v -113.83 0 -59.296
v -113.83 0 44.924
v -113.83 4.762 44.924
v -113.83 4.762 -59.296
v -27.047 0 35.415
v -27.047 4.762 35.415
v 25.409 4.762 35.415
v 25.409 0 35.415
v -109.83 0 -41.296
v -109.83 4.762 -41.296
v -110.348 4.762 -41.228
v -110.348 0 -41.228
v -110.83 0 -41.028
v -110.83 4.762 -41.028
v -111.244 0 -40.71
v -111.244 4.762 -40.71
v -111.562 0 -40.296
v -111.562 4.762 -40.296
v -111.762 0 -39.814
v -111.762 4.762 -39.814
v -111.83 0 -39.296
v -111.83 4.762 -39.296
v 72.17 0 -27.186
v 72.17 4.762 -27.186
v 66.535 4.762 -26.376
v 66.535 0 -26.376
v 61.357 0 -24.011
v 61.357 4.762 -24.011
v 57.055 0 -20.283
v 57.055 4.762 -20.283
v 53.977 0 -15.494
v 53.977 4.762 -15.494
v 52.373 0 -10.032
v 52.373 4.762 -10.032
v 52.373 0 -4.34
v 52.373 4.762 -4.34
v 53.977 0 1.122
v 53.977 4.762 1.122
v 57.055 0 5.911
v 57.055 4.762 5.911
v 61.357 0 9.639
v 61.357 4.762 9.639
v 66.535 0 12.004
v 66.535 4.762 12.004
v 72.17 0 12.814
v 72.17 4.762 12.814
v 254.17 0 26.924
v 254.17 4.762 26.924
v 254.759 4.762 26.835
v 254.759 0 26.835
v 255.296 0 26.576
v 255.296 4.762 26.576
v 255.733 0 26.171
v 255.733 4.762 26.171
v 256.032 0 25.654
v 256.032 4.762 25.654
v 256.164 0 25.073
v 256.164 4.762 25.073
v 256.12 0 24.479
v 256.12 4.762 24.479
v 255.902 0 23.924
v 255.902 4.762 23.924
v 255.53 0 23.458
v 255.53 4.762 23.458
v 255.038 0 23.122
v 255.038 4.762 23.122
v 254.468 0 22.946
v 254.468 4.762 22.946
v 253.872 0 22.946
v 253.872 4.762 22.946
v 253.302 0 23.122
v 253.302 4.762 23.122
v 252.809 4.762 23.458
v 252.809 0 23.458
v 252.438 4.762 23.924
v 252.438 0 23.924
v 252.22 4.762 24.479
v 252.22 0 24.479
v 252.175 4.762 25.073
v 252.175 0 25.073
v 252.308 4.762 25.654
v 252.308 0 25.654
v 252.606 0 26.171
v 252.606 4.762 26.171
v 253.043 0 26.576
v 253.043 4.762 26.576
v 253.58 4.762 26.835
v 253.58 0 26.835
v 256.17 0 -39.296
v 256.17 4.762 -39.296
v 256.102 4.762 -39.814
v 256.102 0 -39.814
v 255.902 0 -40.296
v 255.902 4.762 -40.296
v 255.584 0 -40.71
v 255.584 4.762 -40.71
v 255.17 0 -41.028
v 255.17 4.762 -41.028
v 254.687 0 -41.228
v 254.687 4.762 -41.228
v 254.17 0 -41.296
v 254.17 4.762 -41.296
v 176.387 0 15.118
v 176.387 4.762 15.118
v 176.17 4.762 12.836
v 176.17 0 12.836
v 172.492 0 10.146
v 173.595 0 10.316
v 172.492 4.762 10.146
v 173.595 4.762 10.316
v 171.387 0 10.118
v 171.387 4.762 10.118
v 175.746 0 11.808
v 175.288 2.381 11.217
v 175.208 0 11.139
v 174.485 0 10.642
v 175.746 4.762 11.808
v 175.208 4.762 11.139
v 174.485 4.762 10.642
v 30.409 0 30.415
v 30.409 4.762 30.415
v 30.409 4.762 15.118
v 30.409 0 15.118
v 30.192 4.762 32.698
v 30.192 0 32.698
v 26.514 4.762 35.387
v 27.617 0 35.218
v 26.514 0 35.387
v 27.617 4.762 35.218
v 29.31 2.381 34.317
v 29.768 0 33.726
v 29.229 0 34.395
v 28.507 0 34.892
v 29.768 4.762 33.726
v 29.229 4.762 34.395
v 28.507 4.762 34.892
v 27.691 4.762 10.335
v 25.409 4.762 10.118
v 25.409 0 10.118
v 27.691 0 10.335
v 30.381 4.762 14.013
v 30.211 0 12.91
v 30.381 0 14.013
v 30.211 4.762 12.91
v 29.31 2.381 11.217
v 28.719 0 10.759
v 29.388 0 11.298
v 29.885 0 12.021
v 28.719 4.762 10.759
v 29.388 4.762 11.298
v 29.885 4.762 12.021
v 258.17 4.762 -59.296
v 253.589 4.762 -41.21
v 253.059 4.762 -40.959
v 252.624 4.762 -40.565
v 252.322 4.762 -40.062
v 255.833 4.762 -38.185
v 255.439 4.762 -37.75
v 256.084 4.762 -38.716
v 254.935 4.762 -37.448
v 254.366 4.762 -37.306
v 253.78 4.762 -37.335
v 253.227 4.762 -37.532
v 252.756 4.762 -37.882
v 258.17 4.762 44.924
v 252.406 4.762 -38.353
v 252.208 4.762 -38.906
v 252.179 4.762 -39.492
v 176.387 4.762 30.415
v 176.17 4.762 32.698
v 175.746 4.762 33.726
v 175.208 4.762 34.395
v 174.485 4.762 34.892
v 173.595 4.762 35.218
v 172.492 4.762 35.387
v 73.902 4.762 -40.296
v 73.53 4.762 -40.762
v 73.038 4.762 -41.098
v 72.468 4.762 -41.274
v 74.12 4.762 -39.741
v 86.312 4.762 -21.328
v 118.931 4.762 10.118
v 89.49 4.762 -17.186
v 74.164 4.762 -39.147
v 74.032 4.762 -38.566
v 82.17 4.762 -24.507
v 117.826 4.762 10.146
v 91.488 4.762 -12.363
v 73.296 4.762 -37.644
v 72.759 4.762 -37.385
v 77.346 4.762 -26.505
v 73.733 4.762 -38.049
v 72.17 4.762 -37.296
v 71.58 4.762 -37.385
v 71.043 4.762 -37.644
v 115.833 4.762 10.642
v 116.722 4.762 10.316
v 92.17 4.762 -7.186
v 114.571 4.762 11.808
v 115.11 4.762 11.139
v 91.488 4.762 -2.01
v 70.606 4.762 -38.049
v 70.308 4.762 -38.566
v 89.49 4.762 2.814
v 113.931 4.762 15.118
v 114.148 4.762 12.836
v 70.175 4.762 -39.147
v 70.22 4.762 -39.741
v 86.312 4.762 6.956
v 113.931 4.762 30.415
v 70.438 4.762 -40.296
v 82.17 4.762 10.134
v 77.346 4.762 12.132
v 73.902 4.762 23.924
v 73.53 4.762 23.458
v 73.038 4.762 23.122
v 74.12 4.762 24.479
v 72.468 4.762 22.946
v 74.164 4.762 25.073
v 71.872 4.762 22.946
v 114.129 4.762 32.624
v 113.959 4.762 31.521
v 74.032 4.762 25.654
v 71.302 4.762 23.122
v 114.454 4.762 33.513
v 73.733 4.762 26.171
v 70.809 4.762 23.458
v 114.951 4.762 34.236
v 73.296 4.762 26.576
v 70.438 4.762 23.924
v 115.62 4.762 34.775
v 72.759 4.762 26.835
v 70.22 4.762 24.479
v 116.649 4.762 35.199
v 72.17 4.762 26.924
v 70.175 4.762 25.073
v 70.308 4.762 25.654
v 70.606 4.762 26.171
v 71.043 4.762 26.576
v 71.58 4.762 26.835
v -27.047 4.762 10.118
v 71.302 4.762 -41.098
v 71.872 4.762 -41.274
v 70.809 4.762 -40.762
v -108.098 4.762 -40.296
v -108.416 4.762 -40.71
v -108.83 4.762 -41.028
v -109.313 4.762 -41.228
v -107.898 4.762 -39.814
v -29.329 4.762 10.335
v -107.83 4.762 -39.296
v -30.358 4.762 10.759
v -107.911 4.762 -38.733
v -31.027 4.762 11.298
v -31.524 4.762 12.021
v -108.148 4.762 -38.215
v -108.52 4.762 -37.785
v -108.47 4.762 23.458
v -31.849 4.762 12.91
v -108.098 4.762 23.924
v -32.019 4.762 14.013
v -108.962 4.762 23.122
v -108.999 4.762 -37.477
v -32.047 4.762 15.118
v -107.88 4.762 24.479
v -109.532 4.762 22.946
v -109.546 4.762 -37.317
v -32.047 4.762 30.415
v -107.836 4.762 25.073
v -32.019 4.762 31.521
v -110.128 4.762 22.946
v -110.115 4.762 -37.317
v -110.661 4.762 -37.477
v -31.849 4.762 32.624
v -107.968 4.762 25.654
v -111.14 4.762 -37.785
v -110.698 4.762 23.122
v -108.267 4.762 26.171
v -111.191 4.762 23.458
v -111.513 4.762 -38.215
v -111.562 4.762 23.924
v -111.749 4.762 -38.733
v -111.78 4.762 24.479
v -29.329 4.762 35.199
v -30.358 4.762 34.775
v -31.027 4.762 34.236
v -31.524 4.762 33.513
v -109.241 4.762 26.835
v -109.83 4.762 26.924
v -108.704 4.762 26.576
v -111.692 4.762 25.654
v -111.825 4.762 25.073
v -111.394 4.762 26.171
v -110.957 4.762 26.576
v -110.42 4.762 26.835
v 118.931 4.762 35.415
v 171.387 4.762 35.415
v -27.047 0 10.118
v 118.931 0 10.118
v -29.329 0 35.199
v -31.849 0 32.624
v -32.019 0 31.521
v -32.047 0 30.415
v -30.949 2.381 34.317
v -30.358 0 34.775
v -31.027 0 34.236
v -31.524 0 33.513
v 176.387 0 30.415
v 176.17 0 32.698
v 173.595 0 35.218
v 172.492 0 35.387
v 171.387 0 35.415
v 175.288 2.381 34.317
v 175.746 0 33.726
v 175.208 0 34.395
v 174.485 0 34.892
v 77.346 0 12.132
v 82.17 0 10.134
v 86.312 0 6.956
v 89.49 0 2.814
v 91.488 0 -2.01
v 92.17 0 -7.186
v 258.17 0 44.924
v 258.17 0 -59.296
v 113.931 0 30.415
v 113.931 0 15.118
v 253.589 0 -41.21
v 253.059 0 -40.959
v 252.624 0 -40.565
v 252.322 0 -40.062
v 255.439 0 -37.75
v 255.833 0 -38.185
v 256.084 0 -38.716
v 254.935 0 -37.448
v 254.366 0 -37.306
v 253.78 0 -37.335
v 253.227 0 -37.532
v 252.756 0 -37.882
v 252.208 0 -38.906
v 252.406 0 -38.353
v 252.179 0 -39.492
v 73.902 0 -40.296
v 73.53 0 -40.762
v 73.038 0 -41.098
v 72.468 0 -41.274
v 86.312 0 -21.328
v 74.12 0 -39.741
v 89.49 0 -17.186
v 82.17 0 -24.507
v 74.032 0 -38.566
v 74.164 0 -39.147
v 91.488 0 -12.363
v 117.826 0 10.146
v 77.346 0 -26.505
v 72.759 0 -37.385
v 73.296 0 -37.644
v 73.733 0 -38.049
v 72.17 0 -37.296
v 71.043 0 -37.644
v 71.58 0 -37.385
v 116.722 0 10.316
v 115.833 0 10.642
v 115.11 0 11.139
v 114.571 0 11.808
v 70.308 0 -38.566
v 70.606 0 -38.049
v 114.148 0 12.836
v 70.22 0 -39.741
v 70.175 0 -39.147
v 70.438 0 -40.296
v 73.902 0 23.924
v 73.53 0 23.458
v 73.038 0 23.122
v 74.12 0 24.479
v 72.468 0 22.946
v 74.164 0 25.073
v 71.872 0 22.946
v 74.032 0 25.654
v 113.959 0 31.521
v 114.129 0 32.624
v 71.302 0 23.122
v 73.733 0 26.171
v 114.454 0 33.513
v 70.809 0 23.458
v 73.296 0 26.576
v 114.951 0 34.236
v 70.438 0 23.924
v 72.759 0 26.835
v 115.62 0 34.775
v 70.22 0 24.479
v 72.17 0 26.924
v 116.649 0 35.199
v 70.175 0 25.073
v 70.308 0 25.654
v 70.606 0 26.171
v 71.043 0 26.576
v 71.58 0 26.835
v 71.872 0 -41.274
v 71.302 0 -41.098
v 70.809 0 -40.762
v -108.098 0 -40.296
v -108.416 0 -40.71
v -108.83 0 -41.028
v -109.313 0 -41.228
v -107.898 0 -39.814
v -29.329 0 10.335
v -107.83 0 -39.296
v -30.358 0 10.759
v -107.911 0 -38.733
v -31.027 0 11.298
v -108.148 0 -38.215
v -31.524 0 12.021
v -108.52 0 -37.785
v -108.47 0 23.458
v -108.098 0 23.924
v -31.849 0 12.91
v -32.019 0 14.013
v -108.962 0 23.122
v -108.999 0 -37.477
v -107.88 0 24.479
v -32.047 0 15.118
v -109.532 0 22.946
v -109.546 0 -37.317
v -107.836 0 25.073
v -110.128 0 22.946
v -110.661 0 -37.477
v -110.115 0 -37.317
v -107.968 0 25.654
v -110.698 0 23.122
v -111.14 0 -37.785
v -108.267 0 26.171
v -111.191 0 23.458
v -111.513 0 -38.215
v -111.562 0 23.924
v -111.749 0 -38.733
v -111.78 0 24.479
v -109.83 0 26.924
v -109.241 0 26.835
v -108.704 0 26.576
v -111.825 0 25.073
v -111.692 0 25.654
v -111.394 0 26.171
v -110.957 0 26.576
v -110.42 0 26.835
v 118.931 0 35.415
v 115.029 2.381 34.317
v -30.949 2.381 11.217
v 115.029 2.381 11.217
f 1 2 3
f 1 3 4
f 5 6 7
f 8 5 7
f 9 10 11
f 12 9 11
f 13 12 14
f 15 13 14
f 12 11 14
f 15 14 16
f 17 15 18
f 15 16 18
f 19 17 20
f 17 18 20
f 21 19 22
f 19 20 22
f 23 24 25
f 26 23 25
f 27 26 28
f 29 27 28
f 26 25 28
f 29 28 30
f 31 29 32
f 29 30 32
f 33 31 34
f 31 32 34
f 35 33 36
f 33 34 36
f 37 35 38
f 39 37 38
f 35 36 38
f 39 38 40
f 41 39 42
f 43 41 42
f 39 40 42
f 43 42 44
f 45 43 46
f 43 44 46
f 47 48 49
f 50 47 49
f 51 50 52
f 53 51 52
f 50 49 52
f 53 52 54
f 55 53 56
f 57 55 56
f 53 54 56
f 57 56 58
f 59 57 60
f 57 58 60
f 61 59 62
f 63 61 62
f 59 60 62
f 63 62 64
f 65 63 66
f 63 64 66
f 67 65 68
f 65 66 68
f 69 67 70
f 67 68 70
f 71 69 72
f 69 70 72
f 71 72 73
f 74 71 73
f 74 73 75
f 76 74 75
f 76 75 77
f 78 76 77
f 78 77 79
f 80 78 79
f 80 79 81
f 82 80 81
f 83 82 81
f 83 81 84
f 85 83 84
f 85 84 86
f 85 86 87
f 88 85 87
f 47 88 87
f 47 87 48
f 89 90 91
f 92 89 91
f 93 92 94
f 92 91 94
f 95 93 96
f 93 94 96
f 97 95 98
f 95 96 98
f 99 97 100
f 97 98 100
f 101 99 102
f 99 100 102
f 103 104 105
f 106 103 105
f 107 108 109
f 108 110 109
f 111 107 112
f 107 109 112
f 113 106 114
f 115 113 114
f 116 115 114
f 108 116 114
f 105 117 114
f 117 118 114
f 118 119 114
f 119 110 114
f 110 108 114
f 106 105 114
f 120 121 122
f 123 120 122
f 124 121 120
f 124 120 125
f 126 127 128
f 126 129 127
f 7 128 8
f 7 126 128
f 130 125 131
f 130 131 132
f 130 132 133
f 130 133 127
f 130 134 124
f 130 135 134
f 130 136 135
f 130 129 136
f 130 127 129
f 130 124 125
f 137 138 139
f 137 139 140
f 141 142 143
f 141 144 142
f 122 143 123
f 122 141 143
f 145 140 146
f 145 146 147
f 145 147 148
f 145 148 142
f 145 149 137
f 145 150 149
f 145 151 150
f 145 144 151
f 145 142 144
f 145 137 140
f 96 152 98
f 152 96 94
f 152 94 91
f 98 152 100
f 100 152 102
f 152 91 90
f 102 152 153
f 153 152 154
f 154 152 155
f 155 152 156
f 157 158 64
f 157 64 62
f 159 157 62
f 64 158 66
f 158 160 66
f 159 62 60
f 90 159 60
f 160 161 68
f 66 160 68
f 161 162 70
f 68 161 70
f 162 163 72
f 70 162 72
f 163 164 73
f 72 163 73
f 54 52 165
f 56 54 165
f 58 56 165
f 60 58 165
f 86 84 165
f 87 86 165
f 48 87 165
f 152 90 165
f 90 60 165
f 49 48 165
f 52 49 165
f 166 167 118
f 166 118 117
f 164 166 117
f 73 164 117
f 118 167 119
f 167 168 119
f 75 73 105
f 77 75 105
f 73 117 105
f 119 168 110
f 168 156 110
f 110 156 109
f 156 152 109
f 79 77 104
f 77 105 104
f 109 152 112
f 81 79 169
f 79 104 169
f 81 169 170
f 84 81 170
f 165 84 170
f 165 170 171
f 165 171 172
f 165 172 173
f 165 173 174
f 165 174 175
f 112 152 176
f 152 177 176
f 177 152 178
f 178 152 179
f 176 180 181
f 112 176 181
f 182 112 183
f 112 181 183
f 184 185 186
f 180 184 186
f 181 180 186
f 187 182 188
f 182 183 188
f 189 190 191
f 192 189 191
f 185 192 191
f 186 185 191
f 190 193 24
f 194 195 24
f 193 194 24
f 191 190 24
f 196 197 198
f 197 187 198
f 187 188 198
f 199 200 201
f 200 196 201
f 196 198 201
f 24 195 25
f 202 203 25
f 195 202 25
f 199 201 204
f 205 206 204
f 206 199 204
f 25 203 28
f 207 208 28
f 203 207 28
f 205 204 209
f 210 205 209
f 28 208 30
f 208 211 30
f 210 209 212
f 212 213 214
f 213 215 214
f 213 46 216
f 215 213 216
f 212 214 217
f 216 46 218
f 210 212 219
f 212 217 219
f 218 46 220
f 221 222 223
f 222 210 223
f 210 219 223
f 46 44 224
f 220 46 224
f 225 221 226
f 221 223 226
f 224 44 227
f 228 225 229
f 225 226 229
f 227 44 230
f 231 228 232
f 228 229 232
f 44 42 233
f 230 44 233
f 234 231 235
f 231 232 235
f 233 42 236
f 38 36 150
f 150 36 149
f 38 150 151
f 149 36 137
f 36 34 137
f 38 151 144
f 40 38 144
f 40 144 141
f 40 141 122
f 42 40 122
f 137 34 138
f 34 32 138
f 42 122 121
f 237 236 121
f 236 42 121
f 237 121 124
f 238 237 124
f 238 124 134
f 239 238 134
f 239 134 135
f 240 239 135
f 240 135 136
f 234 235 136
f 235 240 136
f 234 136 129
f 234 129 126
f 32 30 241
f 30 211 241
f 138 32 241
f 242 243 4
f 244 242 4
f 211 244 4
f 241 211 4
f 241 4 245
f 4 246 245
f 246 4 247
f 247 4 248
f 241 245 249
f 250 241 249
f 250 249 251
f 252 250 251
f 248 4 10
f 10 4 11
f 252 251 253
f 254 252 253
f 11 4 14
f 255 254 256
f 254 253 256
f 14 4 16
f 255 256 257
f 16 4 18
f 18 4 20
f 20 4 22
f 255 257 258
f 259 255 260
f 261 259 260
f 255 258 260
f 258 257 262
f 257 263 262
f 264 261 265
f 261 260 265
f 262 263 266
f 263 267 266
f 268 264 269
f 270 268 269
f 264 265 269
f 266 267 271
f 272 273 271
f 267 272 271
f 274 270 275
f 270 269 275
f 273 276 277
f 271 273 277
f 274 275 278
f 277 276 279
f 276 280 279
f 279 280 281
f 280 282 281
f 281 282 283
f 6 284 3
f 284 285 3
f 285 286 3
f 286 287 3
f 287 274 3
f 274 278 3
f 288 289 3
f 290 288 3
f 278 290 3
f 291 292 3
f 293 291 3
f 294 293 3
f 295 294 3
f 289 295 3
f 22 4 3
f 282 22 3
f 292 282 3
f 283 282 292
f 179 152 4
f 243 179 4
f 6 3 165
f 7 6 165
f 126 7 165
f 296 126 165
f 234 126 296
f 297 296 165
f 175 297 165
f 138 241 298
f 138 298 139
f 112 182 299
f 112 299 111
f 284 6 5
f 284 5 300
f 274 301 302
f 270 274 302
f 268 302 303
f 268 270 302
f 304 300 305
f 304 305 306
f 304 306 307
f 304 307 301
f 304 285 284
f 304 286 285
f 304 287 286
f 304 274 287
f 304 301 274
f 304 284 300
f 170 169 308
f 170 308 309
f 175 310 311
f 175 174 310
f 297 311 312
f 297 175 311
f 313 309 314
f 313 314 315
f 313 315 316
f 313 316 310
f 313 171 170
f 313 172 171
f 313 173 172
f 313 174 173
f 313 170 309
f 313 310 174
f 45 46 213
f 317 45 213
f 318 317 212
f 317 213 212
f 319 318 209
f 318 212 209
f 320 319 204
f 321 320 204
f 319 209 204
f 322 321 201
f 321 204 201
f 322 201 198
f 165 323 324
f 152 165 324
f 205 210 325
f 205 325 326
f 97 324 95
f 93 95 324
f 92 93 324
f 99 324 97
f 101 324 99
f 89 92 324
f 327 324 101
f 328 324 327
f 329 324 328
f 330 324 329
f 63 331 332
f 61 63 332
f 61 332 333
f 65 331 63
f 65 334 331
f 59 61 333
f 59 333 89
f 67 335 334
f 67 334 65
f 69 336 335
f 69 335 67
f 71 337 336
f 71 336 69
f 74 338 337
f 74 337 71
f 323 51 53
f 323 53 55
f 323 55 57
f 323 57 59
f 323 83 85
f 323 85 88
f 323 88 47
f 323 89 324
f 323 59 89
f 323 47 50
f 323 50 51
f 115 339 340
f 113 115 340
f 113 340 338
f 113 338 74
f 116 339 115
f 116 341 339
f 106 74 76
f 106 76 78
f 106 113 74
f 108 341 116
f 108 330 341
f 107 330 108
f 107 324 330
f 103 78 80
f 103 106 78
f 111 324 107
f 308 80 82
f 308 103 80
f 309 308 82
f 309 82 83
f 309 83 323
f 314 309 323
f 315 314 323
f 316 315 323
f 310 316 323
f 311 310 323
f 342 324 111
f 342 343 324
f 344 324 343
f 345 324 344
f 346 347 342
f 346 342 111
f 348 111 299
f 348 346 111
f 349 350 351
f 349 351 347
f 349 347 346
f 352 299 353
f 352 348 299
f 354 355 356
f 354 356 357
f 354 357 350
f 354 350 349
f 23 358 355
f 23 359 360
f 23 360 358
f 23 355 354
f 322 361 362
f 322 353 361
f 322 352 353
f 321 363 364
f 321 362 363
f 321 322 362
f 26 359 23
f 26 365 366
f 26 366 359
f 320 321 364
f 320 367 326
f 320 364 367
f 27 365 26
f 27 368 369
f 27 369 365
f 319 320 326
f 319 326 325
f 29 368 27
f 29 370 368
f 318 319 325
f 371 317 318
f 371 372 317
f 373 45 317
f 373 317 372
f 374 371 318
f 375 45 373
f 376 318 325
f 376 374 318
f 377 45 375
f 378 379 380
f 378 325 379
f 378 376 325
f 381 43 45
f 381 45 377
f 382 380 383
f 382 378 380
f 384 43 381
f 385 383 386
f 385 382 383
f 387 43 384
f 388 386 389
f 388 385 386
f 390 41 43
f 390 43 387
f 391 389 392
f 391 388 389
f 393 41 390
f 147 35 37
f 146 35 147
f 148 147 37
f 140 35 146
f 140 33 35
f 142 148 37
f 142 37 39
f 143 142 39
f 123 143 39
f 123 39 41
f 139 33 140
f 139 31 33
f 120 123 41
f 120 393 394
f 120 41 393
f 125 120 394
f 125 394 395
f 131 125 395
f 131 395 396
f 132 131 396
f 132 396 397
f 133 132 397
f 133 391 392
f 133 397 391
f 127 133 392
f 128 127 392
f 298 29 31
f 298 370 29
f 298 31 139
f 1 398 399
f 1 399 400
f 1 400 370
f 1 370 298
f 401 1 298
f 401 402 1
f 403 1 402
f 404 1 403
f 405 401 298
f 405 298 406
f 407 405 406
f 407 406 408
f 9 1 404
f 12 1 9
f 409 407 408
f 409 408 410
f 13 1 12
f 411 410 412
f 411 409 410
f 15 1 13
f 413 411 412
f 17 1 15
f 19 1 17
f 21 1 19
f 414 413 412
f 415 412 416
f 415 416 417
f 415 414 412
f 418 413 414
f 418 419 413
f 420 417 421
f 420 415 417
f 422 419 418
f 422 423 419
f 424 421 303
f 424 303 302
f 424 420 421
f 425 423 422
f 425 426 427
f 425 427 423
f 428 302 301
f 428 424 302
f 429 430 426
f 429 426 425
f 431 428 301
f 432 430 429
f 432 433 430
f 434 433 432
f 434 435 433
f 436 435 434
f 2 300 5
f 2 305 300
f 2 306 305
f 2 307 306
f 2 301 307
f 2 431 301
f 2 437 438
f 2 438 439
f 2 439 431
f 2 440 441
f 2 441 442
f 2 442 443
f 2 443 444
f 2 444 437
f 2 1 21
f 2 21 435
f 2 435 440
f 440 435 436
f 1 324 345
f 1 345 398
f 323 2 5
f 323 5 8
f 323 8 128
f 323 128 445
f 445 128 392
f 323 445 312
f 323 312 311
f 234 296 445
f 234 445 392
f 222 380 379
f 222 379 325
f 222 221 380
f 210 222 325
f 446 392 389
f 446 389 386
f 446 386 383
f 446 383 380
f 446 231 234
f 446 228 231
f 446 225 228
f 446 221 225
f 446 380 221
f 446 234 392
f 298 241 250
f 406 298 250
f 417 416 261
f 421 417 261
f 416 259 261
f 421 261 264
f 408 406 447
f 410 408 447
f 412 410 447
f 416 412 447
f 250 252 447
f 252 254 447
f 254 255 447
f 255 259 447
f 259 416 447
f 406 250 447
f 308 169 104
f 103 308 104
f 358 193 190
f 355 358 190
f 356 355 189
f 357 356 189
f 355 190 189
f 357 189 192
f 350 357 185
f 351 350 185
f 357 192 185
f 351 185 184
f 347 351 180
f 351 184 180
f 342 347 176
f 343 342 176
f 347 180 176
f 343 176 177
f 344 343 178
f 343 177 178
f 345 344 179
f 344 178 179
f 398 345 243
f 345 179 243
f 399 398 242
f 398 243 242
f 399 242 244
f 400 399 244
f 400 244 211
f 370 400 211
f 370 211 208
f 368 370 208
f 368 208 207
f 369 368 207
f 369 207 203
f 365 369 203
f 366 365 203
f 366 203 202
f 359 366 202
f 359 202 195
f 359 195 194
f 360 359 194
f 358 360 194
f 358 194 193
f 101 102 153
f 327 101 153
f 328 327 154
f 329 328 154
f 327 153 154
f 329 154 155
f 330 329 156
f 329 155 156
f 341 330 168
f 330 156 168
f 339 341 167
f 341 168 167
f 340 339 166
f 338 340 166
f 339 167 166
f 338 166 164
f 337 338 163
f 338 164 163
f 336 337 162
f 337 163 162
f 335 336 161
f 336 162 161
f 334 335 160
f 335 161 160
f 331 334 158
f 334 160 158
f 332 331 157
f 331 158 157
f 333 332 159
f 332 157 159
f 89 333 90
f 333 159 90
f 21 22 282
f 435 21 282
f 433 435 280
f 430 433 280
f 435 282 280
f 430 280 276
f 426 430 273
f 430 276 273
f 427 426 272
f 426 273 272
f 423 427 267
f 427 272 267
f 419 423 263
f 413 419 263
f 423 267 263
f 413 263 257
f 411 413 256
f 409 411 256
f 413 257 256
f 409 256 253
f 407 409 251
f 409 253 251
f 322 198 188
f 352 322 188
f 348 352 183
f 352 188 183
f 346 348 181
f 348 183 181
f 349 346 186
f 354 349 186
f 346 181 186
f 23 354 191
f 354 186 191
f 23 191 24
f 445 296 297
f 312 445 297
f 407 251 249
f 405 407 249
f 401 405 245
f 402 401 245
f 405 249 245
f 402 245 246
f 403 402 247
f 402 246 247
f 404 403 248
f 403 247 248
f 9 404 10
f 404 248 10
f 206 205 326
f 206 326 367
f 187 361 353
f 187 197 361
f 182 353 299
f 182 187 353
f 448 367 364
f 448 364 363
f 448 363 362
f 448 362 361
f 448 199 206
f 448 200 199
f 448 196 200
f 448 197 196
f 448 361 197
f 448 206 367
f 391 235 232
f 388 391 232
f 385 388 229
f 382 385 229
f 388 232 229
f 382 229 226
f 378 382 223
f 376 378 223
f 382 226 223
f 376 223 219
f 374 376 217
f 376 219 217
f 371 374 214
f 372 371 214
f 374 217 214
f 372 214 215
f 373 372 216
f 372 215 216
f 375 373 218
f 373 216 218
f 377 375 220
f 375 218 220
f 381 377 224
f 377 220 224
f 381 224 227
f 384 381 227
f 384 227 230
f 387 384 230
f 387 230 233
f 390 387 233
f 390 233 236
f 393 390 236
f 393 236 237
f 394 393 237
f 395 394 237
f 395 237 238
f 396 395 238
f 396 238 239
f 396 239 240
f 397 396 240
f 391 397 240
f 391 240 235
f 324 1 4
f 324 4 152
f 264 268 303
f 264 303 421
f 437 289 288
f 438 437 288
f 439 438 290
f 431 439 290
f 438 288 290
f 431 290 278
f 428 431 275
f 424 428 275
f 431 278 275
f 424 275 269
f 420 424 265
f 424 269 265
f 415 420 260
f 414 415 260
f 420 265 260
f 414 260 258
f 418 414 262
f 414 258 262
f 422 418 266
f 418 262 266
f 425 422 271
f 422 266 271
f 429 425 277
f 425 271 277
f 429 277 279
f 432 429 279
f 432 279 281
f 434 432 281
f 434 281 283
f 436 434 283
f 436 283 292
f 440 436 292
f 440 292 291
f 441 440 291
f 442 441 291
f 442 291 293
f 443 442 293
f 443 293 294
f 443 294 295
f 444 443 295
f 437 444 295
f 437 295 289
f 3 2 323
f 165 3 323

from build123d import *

# Parameters (mm, degrees)
SKETCH1_W           = 372
SKETCH1_H           = 104.22
BOSS_EXTRUDE1_DEPTH = 4.7625
SKETCH2_R           = 2
CUT_EXTRUDE1_DEPTH  = 10
SKETCH3_R           = 2
CUT_EXTRUDE2_DEPTH  = 10
CUT_EXTRUDE3_DEPTH  = 26
SKETCH5_W           = 62.455838456
SKETCH5_H           = 25.297024562
CUT_EXTRUDE4_DEPTH  = 10
FILLET2_SIZE        = 5


with BuildPart() as part:
    # Sketch1 → Boss-Extrude1 (new body)
    with BuildSketch(Plane(origin=(0, 0, 0), x_dir=(1, 0, 0), z_dir=(0, 1, 0))):
        with Locations((72.169818201, 7.186191072)):
            Rectangle(SKETCH1_W, SKETCH1_H)
    extrude(amount=BOSS_EXTRUDE1_DEPTH)

    # Sketch2 → Cut-Extrude1 (cut)
    with BuildSketch(Plane(origin=(0, 4.7625, 0), x_dir=(1, 0, 0), z_dir=(0, 1, 0))):
        with BuildLine():
            ThreePointArc((-107.830181799, 39.296191072), (-108.415968237, 40.710404634), (-109.830181799, 41.296191072))
            Line((-109.830181799, 41.296191072), (-109.830181799, 39.296191072))
            Line((-109.830181799, 39.296191072), (-111.830181799, 39.296191072))
            ThreePointArc((-111.830181799, 39.296191072), (-109.830181799, 37.296191072), (-107.830181799, 39.296191072))
        make_face()
        with BuildLine():
            Line((-109.830181799, 39.296191072), (-109.830181799, 41.296191072))
            ThreePointArc((-109.830181799, 41.296191072), (-111.244395361, 40.710404634), (-111.830181799, 39.296191072))
            Line((-111.830181799, 39.296191072), (-109.830181799, 39.296191072))
        make_face()
        with BuildLine():
            ThreePointArc((256.169818201, 39.296191072), (255.584031763, 40.710404634), (254.169818201, 41.296191072))
            Line((254.169818201, 41.296191072), (254.169818201, 39.296191072))
            Line((254.169818201, 39.296191072), (256.169818201, 39.296191072))
        make_face()
        with BuildLine():
            Line((254.169818201, 39.296191072), (254.169818201, 41.296191072))
            ThreePointArc((254.169818201, 41.296191072), (252.755604639, 37.88197751), (256.169818201, 39.296191072))
            Line((256.169818201, 39.296191072), (254.169818201, 39.296191072))
        make_face()
        with Locations(Location((-109.830181799, -24.923808928, 0), (0, 0, 270))):
            Circle(SKETCH2_R)
        with Locations(Location((254.169818201, -24.923808928, 0), (0, 0, 270))):
            Circle(SKETCH2_R)
    extrude(amount=-CUT_EXTRUDE1_DEPTH, mode=Mode.SUBTRACT)

    # Sketch3 → Cut-Extrude2 (cut)
    with BuildSketch(Plane(origin=(0, 4.7625, 0), x_dir=(1, 0, 0), z_dir=(0, 1, 0))):
        with Locations(Location((72.169818201, 39.296191072, 0), (0, 0, 270))):
            Circle(SKETCH3_R)
        with Locations(Location((72.169818201, -24.923808928, 0), (0, 0, 270))):
            Circle(SKETCH3_R)
    extrude(amount=-CUT_EXTRUDE2_DEPTH, mode=Mode.SUBTRACT)

    # Sketch4 → Cut-Extrude3 (cut)
    with BuildSketch(Plane(origin=(0, 4.7625, 0), x_dir=(1, 0, 0), z_dir=(0, 1, 0))):
        with BuildLine():
            ThreePointArc((92.169818201, 7.186191072), (86.311953825, 21.328326696), (72.169818201, 27.186191072))
            Line((72.169818201, 27.186191072), (72.169818201, -12.813808928))
            ThreePointArc((72.169818201, -12.813808928), (86.311953825, -6.955944552), (92.169818201, 7.186191072))
        make_face()
        with BuildLine():
            Line((72.169818201, -12.813808928), (72.169818201, 27.186191072))
            ThreePointArc((72.169818201, 27.186191072), (52.169818201, 7.186191072), (72.169818201, -12.813808928))
        make_face()
    extrude(amount=-CUT_EXTRUDE3_DEPTH, mode=Mode.SUBTRACT)

    # Sketch5 → Cut-Extrude4 (cut)
    with BuildSketch(Plane(origin=(0, 4.7625, 0), x_dir=(1, 0, 0), z_dir=(0, 1, 0))):
        with Locations((-0.819204667, -22.766901993)):
            Rectangle(SKETCH5_W, SKETCH5_H)
        with Locations((145.158841069, -22.766901993)):
            Rectangle(SKETCH5_W, SKETCH5_H)
    extrude(amount=-CUT_EXTRUDE4_DEPTH, mode=Mode.SUBTRACT)

    # Fillet2
    # a fillet whose section is not a circle: 5 mm, written as the material it adds along each edge
    with BuildSketch(Plane(origin=(176.386760297, 4.7625, 35.415414274), x_dir=(0, 0, -1), z_dir=(0, -1, 0)), Plane(origin=(113.930921841, 4.7625, 10.118389712), x_dir=(0, 0, 1), z_dir=(0, -1, 0)), Plane(origin=(113.930921841, 4.7625, 35.415414274), x_dir=(1, 0, 0), z_dir=(0, -1, 0)), Plane(origin=(30.408714561, 4.7625, 35.415414274), x_dir=(0, 0, -1), z_dir=(0, -1, 0)), Plane(origin=(30.408714561, 4.7625, 10.118389712), x_dir=(-1, 0, 0), z_dir=(0, -1, 0)), Plane(origin=(-32.047123895, 4.7625, 35.415414274), x_dir=(1, 0, 0), z_dir=(0, -1, 0))) as fillet2_piece_1:
        with BuildLine():
            add(Edge.make_bspline([(FILLET2_SIZE, 0), (FILLET2_SIZE * 0.831801948466, 0), (FILLET2_SIZE * 0.663603896932, 0), (FILLET2_SIZE * 0.292893218813, -FILLET2_SIZE * 0.0716919198361), (FILLET2_SIZE * 0.0716919198361, -FILLET2_SIZE * 0.292893218813), (0, -FILLET2_SIZE * 0.663603896932), (0, -FILLET2_SIZE * 0.831801948466), (0, -FILLET2_SIZE)], knots=[0, 0, 0, 0, 0, 0, 0.5, 0.5, 1, 1, 1, 1, 1, 1], degree=5))
            Line((0, -FILLET2_SIZE), (-FILLET2_SIZE * 0.02, -FILLET2_SIZE))
            Line((-FILLET2_SIZE * 0.02, -FILLET2_SIZE), (-FILLET2_SIZE * 0.02, FILLET2_SIZE * 0.02))
            Line((-FILLET2_SIZE * 0.02, FILLET2_SIZE * 0.02), (FILLET2_SIZE, FILLET2_SIZE * 0.02))
            Line((FILLET2_SIZE, FILLET2_SIZE * 0.02), (FILLET2_SIZE, 0))
        make_face()
    extrude(amount=4.7625)
    with BuildSketch(Plane(origin=(176.386760297, 4.7625, 10.118389712), x_dir=(0, 0, 1), z_dir=(0, -1, 0)), Plane(origin=(-32.047123895, 4.7625, 10.118389712), x_dir=(1, 0, 0), z_dir=(0, -1, 0))) as fillet2_piece_2:
        with BuildLine():
            add(Edge.make_bspline([(FILLET2_SIZE, 0), (FILLET2_SIZE * 0.831801948466, 0), (FILLET2_SIZE * 0.663603896932, 0), (FILLET2_SIZE * 0.292893218813, FILLET2_SIZE * 0.0716919198361), (FILLET2_SIZE * 0.0716919198361, FILLET2_SIZE * 0.292893218813), (0, FILLET2_SIZE * 0.663603896932), (0, FILLET2_SIZE * 0.831801948466), (0, FILLET2_SIZE)], knots=[0, 0, 0, 0, 0, 0, 0.5, 0.5, 1, 1, 1, 1, 1, 1], degree=5))
            Line((0, FILLET2_SIZE), (-FILLET2_SIZE * 0.02, FILLET2_SIZE))
            Line((-FILLET2_SIZE * 0.02, FILLET2_SIZE), (-FILLET2_SIZE * 0.02, -FILLET2_SIZE * 0.02))
            Line((-FILLET2_SIZE * 0.02, -FILLET2_SIZE * 0.02), (FILLET2_SIZE, -FILLET2_SIZE * 0.02))
            Line((FILLET2_SIZE, -FILLET2_SIZE * 0.02), (FILLET2_SIZE, 0))
        make_face()
    extrude(amount=4.7625)


solid = part.part
